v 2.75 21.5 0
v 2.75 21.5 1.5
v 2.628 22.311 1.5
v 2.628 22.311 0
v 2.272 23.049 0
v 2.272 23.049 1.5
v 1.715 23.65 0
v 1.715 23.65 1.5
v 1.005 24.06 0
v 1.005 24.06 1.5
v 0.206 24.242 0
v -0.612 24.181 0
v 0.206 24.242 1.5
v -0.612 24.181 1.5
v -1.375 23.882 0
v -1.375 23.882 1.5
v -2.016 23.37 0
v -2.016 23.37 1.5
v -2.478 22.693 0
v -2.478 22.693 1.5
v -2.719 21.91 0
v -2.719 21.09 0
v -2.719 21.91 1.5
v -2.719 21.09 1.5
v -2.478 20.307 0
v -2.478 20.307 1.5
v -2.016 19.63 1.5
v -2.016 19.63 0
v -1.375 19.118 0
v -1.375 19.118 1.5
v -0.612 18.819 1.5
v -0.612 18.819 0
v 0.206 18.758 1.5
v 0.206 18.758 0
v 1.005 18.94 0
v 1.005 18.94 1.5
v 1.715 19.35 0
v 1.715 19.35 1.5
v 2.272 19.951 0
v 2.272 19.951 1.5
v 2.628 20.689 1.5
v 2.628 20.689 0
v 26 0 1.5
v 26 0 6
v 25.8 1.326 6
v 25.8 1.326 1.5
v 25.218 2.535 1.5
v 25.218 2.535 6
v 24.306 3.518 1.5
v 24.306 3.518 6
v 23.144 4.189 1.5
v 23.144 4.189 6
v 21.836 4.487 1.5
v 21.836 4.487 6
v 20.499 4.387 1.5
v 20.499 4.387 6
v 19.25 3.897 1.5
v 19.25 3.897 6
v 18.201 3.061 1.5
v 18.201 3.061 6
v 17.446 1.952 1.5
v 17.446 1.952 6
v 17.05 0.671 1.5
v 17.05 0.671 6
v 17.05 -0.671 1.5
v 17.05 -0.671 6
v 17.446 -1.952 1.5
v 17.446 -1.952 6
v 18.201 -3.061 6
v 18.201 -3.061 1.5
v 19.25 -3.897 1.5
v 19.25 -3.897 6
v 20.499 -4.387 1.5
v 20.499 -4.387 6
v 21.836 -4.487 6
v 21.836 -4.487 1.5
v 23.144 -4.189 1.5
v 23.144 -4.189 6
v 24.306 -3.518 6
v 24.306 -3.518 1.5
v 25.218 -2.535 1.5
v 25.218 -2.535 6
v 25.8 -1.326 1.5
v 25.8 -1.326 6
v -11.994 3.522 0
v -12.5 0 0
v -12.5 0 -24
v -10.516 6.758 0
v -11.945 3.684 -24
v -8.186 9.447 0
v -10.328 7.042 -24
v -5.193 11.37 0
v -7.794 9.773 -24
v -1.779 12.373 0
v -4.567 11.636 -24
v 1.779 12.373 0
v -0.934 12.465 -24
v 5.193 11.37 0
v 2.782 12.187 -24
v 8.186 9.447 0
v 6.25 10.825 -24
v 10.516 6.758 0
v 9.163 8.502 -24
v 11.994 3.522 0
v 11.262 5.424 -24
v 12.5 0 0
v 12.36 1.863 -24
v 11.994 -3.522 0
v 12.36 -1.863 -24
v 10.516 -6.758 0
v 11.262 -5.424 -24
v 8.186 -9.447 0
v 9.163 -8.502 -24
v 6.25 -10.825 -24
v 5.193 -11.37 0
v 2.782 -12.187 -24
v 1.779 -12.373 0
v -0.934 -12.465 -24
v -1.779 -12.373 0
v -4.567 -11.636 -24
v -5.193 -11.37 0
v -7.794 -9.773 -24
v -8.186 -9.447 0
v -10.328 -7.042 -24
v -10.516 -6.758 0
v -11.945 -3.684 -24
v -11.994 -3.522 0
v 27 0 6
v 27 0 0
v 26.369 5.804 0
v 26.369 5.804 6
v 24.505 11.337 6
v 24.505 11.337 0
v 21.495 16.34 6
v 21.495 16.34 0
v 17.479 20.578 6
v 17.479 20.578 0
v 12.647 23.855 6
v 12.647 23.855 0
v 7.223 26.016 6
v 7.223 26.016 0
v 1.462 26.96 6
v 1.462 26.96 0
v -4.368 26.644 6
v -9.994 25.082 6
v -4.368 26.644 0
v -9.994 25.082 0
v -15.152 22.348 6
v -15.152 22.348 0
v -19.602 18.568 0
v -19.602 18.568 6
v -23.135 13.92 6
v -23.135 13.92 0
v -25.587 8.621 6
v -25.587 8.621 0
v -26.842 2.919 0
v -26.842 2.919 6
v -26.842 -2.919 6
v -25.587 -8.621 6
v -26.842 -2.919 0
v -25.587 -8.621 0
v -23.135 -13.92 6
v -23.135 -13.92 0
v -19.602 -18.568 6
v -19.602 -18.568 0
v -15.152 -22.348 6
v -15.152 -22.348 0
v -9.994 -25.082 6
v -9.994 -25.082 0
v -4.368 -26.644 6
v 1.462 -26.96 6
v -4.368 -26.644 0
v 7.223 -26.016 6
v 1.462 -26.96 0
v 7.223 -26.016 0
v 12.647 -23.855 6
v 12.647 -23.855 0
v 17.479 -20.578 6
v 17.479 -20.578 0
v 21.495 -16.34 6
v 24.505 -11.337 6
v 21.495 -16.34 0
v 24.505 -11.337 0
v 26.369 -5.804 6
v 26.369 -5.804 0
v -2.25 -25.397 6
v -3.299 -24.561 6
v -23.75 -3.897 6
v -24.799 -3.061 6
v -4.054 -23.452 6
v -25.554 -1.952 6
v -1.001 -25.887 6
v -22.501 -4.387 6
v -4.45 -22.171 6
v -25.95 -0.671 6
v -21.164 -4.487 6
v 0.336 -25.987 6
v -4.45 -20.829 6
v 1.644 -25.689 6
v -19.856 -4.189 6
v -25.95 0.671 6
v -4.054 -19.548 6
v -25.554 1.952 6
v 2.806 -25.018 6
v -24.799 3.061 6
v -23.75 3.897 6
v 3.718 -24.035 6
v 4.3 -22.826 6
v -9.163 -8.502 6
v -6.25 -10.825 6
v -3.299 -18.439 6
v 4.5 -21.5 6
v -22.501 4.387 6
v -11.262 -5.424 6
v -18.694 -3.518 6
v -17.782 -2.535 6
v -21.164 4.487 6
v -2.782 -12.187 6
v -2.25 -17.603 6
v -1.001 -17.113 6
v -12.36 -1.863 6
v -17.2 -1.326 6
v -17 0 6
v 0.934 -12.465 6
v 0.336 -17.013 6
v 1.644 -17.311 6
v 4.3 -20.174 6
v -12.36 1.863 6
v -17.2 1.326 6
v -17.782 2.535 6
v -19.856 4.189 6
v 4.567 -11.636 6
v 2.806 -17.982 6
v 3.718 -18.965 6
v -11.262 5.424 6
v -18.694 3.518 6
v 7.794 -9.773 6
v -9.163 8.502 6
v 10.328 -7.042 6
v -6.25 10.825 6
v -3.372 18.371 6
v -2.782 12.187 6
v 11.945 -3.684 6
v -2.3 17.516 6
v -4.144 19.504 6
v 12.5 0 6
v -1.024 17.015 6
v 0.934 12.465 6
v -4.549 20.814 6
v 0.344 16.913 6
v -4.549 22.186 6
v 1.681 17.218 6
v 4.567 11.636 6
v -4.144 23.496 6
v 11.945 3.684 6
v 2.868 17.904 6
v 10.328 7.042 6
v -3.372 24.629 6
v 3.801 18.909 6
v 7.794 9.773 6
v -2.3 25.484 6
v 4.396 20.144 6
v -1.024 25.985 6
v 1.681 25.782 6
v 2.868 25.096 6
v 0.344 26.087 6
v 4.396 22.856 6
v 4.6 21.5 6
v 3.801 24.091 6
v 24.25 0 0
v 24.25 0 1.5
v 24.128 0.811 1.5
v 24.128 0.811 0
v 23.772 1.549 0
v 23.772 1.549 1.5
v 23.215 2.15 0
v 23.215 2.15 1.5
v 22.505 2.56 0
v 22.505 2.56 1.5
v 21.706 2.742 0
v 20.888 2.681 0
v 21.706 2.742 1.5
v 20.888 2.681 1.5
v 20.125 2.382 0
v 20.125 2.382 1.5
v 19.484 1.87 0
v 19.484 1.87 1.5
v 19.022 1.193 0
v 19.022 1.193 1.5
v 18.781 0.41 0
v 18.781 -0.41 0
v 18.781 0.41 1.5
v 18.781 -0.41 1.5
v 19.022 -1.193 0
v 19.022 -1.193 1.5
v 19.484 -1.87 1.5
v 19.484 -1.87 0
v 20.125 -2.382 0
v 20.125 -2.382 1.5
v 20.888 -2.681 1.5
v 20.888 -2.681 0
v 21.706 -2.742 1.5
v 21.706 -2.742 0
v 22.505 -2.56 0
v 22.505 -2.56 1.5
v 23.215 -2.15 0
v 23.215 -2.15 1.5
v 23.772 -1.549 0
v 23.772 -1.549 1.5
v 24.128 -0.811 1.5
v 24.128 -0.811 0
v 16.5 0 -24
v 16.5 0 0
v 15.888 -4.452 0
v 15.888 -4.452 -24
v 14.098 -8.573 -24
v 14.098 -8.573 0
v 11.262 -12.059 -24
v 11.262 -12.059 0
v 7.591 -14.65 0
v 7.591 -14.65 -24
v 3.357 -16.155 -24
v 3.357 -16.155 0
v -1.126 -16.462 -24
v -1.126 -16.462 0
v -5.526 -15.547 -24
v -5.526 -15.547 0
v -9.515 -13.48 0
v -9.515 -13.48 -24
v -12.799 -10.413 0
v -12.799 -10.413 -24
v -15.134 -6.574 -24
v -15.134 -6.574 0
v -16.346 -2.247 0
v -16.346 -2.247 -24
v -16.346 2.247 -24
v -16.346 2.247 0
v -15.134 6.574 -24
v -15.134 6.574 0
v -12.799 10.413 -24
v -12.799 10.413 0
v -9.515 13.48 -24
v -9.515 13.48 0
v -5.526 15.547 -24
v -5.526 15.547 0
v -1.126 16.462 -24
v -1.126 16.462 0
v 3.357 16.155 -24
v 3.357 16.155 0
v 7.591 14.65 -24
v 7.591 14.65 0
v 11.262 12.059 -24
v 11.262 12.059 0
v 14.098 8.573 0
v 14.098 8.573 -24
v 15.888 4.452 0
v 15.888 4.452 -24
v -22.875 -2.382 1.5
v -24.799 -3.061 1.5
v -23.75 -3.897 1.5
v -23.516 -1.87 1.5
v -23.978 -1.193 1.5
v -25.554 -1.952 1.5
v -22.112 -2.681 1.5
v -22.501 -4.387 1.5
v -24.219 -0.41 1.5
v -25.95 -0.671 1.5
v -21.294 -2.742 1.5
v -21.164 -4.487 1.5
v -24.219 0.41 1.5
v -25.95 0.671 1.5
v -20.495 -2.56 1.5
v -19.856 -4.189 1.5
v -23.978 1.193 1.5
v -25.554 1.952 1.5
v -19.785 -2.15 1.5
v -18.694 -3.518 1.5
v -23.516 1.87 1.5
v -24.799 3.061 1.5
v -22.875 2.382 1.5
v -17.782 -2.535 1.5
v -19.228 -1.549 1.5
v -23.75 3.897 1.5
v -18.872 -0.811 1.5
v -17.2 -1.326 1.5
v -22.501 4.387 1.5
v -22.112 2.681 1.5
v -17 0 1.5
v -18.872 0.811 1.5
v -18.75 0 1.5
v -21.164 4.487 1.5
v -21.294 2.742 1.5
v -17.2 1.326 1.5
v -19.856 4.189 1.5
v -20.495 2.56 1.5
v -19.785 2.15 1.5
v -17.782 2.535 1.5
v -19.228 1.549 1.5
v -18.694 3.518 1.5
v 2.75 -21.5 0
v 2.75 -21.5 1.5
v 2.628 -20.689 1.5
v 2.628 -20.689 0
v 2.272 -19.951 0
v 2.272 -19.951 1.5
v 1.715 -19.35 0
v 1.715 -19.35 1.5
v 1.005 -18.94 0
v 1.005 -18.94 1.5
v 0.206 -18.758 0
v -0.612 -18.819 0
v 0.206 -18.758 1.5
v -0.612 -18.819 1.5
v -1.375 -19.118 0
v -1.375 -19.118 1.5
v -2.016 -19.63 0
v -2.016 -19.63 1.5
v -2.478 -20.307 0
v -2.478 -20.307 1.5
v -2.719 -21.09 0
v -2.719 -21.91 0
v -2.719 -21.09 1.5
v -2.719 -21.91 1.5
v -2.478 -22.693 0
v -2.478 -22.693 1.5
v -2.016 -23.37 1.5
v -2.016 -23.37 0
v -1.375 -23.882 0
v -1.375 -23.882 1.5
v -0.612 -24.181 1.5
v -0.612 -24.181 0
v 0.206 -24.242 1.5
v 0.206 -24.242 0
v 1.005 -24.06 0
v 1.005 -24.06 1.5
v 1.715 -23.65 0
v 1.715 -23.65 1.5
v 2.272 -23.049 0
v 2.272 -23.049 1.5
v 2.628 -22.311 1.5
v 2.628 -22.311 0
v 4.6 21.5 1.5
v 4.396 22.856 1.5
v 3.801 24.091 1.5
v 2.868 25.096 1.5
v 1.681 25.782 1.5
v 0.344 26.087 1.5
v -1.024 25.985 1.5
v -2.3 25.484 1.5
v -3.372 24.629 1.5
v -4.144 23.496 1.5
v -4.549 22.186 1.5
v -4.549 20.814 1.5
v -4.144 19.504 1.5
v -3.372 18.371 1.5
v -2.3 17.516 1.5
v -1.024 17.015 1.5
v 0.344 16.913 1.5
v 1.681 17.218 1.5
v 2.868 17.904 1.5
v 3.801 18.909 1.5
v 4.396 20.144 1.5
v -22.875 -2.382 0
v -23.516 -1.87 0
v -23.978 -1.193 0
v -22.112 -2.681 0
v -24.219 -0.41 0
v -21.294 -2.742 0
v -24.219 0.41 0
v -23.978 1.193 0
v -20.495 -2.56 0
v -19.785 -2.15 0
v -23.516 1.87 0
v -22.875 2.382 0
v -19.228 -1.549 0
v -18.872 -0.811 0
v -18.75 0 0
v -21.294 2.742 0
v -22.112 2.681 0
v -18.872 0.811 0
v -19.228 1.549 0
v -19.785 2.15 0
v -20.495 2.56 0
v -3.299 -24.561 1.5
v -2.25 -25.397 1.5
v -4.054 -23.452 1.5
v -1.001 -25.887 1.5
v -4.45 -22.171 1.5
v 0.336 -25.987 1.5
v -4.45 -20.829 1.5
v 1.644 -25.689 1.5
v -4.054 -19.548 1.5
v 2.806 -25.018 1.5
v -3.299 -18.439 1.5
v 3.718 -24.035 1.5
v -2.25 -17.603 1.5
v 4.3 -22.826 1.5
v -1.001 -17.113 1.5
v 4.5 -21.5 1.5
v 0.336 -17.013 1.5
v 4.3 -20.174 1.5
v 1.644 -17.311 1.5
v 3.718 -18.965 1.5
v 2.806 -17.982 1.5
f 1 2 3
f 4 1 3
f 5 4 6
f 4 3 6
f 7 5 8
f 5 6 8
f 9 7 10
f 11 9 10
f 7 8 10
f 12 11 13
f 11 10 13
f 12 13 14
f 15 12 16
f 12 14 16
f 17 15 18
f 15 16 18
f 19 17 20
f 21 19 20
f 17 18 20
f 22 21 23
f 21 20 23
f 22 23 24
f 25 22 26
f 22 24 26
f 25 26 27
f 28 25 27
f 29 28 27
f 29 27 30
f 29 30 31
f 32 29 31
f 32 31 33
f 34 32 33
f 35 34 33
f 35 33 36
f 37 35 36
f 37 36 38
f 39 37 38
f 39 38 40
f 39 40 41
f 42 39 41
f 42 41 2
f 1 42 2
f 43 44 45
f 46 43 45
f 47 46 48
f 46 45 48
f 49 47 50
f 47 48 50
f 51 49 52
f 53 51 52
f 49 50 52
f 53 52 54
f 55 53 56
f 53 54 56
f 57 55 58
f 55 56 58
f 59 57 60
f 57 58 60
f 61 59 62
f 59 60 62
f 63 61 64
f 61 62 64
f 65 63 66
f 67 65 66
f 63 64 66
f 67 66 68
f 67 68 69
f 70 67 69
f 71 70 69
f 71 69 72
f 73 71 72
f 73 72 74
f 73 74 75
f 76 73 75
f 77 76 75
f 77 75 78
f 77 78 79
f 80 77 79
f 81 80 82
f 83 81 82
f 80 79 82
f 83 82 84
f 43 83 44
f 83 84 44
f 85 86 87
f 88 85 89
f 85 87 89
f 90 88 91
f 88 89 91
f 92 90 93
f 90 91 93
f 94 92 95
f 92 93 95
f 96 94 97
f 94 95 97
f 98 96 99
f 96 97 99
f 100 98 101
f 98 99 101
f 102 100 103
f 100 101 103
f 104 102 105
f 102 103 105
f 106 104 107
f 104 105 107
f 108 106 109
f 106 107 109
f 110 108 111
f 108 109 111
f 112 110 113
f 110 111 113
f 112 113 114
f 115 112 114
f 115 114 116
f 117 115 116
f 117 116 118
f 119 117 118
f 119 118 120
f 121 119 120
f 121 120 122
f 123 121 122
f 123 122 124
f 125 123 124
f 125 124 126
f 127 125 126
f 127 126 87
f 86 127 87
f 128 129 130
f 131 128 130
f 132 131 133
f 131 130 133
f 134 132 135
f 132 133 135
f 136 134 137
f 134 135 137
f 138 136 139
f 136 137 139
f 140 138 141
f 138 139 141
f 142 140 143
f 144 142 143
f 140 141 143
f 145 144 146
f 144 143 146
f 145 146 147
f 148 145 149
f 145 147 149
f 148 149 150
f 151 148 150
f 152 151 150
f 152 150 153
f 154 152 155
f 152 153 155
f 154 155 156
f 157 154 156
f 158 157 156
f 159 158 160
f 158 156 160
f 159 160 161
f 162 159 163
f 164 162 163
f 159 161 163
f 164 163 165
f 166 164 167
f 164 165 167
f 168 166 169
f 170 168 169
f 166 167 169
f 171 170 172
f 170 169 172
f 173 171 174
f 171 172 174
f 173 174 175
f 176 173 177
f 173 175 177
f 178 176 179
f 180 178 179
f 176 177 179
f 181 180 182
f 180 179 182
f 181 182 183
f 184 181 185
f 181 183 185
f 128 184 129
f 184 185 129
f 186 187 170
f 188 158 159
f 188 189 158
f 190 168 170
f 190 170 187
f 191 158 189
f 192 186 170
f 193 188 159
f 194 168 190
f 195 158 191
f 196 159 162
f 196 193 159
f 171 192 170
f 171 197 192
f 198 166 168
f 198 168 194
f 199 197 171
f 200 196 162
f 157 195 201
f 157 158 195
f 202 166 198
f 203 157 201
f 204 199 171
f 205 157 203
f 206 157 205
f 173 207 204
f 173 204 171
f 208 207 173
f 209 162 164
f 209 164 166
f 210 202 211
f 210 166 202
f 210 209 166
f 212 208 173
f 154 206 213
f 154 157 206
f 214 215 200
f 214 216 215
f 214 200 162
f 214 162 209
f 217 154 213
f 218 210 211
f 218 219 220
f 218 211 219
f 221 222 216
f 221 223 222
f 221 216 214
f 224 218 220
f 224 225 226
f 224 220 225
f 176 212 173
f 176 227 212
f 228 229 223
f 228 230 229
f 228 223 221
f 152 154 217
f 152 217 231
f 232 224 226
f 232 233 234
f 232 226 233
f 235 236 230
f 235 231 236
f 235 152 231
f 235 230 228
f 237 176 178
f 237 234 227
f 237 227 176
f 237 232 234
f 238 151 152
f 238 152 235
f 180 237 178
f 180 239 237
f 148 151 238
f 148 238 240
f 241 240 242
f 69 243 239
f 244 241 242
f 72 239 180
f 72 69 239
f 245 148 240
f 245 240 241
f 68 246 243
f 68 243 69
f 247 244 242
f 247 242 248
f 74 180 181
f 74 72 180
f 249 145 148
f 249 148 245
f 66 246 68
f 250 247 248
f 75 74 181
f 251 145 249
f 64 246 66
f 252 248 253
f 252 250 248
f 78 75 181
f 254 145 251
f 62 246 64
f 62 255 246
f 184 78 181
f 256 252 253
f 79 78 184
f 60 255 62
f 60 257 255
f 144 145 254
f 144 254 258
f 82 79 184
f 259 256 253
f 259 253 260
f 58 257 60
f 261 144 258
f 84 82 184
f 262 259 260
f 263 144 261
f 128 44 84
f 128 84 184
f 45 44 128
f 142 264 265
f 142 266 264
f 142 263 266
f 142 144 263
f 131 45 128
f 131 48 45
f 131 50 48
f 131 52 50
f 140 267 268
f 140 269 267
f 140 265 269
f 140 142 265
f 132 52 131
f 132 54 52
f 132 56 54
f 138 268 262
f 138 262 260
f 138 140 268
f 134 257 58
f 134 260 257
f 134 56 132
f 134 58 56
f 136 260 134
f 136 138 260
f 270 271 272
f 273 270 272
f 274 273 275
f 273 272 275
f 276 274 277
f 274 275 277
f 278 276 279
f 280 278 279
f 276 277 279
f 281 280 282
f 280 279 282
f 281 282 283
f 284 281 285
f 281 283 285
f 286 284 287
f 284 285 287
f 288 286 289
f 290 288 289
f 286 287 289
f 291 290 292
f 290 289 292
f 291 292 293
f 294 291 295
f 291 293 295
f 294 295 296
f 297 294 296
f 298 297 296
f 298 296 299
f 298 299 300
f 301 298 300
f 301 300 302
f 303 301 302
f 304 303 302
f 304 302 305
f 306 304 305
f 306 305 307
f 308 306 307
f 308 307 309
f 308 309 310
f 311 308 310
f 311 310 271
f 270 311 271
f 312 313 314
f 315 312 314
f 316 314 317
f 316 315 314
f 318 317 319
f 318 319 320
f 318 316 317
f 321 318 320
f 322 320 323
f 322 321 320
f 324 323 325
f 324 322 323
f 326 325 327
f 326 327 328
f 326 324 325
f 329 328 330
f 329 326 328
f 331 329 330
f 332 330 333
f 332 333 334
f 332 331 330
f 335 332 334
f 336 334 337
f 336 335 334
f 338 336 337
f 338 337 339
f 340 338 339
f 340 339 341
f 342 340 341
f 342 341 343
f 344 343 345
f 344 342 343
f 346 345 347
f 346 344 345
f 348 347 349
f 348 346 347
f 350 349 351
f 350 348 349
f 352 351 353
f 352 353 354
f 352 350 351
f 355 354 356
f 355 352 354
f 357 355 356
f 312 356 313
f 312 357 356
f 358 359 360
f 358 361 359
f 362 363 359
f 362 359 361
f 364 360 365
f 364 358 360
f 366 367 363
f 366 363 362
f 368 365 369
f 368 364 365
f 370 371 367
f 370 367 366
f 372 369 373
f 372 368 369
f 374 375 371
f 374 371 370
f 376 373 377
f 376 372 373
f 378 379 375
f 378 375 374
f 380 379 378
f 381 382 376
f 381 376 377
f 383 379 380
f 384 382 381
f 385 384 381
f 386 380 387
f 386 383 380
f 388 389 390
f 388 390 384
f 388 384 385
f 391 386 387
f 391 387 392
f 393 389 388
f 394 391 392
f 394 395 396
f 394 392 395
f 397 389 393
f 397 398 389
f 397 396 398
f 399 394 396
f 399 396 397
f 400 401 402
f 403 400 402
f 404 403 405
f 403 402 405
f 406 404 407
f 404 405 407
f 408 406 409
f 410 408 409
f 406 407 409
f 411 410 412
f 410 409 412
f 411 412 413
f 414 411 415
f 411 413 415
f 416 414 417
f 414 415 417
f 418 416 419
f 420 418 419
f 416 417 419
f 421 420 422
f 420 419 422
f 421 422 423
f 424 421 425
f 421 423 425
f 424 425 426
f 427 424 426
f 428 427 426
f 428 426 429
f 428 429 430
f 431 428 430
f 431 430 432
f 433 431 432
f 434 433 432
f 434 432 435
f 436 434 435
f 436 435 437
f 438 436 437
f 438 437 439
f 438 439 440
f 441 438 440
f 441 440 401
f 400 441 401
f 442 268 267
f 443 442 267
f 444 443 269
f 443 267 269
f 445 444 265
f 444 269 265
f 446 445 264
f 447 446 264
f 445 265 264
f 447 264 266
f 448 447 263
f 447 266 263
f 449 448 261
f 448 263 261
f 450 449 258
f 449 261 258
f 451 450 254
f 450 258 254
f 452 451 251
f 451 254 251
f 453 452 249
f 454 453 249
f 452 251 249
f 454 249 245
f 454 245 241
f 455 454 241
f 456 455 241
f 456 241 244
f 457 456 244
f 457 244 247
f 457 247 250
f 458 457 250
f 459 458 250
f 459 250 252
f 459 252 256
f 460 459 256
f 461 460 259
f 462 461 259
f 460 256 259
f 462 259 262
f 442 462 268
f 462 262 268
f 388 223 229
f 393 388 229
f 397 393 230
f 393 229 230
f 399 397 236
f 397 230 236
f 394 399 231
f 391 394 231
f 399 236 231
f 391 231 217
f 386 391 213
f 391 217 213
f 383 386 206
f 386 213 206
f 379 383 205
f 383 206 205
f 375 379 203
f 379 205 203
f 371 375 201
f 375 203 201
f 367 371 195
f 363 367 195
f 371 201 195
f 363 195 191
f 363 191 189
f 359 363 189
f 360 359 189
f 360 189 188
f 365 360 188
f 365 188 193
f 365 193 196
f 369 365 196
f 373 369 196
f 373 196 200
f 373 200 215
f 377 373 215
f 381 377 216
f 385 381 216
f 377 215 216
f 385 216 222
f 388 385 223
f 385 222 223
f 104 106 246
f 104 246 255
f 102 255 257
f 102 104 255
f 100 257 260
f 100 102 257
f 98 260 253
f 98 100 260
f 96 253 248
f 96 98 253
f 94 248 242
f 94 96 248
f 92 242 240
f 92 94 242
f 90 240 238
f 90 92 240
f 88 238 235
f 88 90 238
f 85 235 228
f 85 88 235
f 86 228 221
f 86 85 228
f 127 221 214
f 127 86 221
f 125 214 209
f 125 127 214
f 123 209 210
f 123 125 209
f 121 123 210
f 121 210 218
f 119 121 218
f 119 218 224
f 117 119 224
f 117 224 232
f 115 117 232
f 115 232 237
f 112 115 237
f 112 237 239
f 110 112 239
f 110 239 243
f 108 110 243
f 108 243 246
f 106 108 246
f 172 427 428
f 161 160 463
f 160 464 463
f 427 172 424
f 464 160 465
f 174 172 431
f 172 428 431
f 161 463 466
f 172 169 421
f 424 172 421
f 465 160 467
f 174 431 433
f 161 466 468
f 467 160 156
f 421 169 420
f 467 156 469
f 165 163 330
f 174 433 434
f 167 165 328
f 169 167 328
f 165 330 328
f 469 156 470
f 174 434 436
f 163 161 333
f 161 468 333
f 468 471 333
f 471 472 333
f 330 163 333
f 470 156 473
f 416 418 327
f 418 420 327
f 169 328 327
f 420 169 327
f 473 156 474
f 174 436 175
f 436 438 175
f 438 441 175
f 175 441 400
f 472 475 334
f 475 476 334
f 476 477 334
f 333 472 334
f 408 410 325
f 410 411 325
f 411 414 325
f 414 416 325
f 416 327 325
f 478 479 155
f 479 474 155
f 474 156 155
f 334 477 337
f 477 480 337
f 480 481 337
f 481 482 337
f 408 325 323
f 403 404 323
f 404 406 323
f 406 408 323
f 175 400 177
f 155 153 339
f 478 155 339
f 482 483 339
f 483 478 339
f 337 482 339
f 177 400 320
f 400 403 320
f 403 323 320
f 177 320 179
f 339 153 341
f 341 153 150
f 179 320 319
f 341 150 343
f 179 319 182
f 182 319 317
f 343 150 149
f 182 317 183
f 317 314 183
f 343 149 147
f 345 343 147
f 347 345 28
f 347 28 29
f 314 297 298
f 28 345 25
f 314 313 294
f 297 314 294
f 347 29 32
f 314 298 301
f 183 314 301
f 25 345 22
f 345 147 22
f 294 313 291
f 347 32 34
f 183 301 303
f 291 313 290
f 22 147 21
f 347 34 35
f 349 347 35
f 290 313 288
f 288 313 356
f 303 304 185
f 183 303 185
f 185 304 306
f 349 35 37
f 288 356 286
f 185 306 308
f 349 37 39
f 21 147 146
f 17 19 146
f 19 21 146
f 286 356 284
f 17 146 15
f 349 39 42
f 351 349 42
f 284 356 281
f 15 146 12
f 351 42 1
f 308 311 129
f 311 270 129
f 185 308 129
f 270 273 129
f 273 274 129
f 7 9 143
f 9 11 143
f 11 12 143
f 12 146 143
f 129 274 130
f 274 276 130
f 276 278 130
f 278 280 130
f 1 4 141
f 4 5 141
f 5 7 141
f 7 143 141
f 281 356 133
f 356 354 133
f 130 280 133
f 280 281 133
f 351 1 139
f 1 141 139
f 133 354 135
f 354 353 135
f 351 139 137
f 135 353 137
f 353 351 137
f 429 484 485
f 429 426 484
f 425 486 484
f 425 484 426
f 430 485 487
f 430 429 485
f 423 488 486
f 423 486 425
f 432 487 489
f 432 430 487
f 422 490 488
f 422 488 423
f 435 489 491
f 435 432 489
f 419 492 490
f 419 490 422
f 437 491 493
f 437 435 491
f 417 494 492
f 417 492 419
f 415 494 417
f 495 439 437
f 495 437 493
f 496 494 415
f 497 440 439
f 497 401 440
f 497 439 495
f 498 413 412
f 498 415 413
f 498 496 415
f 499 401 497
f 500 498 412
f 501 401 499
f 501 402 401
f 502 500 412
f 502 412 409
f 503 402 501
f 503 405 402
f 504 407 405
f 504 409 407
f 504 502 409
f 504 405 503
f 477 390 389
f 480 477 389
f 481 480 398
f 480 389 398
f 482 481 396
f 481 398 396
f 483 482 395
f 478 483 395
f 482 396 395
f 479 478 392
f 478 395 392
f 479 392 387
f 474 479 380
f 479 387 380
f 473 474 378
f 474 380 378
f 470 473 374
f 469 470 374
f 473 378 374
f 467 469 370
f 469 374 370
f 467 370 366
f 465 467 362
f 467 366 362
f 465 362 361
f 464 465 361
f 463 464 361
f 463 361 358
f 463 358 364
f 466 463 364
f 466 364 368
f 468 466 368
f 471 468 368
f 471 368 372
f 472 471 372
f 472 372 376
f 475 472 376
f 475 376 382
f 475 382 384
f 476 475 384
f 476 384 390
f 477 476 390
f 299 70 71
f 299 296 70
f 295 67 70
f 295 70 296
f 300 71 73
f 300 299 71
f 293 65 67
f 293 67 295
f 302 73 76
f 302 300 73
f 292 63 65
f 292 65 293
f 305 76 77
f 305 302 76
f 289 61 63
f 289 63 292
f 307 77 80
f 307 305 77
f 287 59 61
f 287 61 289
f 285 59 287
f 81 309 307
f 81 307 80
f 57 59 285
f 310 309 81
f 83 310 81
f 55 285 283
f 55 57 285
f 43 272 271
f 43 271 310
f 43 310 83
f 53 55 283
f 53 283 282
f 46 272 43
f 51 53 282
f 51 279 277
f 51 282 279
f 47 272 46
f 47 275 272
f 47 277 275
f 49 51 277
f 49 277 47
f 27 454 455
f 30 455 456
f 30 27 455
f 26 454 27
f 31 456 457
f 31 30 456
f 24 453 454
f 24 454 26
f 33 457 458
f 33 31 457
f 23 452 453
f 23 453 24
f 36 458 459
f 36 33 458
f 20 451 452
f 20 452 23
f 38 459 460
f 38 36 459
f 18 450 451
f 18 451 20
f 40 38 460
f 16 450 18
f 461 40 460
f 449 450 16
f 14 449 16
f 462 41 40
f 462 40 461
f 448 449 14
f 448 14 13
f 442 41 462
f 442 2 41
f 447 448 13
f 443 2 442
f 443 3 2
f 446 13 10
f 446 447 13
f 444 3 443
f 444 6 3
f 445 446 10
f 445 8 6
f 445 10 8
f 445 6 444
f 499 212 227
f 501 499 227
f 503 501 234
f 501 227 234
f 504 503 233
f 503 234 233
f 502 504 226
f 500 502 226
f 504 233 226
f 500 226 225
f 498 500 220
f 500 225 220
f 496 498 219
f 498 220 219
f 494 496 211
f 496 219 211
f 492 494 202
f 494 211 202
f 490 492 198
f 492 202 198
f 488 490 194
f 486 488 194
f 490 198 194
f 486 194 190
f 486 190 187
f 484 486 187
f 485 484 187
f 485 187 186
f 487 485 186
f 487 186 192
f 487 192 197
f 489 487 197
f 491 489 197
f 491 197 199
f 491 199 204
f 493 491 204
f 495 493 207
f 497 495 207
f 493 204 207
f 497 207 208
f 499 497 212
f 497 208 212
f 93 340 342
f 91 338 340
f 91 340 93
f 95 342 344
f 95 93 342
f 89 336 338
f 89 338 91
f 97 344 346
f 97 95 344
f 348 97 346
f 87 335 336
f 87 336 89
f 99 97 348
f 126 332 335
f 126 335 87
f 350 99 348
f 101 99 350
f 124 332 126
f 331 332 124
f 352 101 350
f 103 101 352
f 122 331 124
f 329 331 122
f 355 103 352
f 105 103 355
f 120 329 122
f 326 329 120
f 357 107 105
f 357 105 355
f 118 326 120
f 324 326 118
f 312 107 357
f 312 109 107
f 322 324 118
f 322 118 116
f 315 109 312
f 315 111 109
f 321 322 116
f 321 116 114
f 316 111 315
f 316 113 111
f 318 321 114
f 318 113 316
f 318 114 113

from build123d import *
from build123d.topology import SkipClean

# Parameters (mm, degrees)
SKETCH_1_R          = 27
SKETCH_1_R_2        = 12.5
EXTRUDE_3_DEPTH     = 6
EXTRUDE_START       = 24
SKETCH_2_R          = 16.5
SKETCH_2_R_2        = 12.5
EXTRUDE_4_DEPTH     = 24
SKETCH_3_R          = 2.75
CUT_EXTRUDE_1_DEPTH = 24
SKETCH_4_R          = 4.6
SKETCH_4_R_2        = 4.5
CUT_EXTRUDE_2_DEPTH = 4.5


with BuildPart() as part:
    # 草图1 → 凸台-拉伸3 (new body)
    with BuildSketch(Plane.XY):
        Circle(SKETCH_1_R)
        Circle(SKETCH_1_R_2, mode=Mode.SUBTRACT)
    extrude(amount=EXTRUDE_3_DEPTH)

    # 草图2 → 凸台-拉伸4 (add)
    with SkipClean():  # the faces are left unmerged after this step: merging them gives an invalid solid
        with BuildSketch(Plane(origin=(0, 0, 0), x_dir=(-1, 0, 0), z_dir=(0, 0, -1)).offset(EXTRUDE_START)):
            with Locations(Location((0, 0, 0), (0, 0, 180))):
                Circle(SKETCH_2_R)
            Circle(SKETCH_2_R_2, mode=Mode.SUBTRACT)
        extrude(amount=-EXTRUDE_4_DEPTH)

    # 草图3 → 切除-拉伸1 (cut)
    with SkipClean():  # the faces are left unmerged after this step: merging them gives an invalid solid
        with BuildSketch(Plane.XY.offset(6)):
            with Locations((0, 21.5)):
                Circle(SKETCH_3_R)
            with Locations((21.5, 0)):
                Circle(SKETCH_3_R)
            with Locations((0, -21.5)):
                Circle(SKETCH_3_R)
            with Locations((-21.5, 0)):
                Circle(SKETCH_3_R)
        extrude(amount=-CUT_EXTRUDE_1_DEPTH, mode=Mode.SUBTRACT)

    # 草图4 → 切除-拉伸2 (cut)
    with SkipClean():  # the faces are left unmerged after this step: merging them gives an invalid solid
        with BuildSketch(Plane.XY.offset(6)):
            with Locations((0, 21.5)):
                Circle(SKETCH_4_R)
            with Locations((21.5, 0)):
                Circle(SKETCH_4_R_2)
            with Locations((0, -21.5)):
                Circle(SKETCH_4_R_2)
            with Locations((-21.5, 0)):
                Circle(SKETCH_4_R_2)
        extrude(amount=-CUT_EXTRUDE_2_DEPTH, mode=Mode.SUBTRACT)


solid = part.part
